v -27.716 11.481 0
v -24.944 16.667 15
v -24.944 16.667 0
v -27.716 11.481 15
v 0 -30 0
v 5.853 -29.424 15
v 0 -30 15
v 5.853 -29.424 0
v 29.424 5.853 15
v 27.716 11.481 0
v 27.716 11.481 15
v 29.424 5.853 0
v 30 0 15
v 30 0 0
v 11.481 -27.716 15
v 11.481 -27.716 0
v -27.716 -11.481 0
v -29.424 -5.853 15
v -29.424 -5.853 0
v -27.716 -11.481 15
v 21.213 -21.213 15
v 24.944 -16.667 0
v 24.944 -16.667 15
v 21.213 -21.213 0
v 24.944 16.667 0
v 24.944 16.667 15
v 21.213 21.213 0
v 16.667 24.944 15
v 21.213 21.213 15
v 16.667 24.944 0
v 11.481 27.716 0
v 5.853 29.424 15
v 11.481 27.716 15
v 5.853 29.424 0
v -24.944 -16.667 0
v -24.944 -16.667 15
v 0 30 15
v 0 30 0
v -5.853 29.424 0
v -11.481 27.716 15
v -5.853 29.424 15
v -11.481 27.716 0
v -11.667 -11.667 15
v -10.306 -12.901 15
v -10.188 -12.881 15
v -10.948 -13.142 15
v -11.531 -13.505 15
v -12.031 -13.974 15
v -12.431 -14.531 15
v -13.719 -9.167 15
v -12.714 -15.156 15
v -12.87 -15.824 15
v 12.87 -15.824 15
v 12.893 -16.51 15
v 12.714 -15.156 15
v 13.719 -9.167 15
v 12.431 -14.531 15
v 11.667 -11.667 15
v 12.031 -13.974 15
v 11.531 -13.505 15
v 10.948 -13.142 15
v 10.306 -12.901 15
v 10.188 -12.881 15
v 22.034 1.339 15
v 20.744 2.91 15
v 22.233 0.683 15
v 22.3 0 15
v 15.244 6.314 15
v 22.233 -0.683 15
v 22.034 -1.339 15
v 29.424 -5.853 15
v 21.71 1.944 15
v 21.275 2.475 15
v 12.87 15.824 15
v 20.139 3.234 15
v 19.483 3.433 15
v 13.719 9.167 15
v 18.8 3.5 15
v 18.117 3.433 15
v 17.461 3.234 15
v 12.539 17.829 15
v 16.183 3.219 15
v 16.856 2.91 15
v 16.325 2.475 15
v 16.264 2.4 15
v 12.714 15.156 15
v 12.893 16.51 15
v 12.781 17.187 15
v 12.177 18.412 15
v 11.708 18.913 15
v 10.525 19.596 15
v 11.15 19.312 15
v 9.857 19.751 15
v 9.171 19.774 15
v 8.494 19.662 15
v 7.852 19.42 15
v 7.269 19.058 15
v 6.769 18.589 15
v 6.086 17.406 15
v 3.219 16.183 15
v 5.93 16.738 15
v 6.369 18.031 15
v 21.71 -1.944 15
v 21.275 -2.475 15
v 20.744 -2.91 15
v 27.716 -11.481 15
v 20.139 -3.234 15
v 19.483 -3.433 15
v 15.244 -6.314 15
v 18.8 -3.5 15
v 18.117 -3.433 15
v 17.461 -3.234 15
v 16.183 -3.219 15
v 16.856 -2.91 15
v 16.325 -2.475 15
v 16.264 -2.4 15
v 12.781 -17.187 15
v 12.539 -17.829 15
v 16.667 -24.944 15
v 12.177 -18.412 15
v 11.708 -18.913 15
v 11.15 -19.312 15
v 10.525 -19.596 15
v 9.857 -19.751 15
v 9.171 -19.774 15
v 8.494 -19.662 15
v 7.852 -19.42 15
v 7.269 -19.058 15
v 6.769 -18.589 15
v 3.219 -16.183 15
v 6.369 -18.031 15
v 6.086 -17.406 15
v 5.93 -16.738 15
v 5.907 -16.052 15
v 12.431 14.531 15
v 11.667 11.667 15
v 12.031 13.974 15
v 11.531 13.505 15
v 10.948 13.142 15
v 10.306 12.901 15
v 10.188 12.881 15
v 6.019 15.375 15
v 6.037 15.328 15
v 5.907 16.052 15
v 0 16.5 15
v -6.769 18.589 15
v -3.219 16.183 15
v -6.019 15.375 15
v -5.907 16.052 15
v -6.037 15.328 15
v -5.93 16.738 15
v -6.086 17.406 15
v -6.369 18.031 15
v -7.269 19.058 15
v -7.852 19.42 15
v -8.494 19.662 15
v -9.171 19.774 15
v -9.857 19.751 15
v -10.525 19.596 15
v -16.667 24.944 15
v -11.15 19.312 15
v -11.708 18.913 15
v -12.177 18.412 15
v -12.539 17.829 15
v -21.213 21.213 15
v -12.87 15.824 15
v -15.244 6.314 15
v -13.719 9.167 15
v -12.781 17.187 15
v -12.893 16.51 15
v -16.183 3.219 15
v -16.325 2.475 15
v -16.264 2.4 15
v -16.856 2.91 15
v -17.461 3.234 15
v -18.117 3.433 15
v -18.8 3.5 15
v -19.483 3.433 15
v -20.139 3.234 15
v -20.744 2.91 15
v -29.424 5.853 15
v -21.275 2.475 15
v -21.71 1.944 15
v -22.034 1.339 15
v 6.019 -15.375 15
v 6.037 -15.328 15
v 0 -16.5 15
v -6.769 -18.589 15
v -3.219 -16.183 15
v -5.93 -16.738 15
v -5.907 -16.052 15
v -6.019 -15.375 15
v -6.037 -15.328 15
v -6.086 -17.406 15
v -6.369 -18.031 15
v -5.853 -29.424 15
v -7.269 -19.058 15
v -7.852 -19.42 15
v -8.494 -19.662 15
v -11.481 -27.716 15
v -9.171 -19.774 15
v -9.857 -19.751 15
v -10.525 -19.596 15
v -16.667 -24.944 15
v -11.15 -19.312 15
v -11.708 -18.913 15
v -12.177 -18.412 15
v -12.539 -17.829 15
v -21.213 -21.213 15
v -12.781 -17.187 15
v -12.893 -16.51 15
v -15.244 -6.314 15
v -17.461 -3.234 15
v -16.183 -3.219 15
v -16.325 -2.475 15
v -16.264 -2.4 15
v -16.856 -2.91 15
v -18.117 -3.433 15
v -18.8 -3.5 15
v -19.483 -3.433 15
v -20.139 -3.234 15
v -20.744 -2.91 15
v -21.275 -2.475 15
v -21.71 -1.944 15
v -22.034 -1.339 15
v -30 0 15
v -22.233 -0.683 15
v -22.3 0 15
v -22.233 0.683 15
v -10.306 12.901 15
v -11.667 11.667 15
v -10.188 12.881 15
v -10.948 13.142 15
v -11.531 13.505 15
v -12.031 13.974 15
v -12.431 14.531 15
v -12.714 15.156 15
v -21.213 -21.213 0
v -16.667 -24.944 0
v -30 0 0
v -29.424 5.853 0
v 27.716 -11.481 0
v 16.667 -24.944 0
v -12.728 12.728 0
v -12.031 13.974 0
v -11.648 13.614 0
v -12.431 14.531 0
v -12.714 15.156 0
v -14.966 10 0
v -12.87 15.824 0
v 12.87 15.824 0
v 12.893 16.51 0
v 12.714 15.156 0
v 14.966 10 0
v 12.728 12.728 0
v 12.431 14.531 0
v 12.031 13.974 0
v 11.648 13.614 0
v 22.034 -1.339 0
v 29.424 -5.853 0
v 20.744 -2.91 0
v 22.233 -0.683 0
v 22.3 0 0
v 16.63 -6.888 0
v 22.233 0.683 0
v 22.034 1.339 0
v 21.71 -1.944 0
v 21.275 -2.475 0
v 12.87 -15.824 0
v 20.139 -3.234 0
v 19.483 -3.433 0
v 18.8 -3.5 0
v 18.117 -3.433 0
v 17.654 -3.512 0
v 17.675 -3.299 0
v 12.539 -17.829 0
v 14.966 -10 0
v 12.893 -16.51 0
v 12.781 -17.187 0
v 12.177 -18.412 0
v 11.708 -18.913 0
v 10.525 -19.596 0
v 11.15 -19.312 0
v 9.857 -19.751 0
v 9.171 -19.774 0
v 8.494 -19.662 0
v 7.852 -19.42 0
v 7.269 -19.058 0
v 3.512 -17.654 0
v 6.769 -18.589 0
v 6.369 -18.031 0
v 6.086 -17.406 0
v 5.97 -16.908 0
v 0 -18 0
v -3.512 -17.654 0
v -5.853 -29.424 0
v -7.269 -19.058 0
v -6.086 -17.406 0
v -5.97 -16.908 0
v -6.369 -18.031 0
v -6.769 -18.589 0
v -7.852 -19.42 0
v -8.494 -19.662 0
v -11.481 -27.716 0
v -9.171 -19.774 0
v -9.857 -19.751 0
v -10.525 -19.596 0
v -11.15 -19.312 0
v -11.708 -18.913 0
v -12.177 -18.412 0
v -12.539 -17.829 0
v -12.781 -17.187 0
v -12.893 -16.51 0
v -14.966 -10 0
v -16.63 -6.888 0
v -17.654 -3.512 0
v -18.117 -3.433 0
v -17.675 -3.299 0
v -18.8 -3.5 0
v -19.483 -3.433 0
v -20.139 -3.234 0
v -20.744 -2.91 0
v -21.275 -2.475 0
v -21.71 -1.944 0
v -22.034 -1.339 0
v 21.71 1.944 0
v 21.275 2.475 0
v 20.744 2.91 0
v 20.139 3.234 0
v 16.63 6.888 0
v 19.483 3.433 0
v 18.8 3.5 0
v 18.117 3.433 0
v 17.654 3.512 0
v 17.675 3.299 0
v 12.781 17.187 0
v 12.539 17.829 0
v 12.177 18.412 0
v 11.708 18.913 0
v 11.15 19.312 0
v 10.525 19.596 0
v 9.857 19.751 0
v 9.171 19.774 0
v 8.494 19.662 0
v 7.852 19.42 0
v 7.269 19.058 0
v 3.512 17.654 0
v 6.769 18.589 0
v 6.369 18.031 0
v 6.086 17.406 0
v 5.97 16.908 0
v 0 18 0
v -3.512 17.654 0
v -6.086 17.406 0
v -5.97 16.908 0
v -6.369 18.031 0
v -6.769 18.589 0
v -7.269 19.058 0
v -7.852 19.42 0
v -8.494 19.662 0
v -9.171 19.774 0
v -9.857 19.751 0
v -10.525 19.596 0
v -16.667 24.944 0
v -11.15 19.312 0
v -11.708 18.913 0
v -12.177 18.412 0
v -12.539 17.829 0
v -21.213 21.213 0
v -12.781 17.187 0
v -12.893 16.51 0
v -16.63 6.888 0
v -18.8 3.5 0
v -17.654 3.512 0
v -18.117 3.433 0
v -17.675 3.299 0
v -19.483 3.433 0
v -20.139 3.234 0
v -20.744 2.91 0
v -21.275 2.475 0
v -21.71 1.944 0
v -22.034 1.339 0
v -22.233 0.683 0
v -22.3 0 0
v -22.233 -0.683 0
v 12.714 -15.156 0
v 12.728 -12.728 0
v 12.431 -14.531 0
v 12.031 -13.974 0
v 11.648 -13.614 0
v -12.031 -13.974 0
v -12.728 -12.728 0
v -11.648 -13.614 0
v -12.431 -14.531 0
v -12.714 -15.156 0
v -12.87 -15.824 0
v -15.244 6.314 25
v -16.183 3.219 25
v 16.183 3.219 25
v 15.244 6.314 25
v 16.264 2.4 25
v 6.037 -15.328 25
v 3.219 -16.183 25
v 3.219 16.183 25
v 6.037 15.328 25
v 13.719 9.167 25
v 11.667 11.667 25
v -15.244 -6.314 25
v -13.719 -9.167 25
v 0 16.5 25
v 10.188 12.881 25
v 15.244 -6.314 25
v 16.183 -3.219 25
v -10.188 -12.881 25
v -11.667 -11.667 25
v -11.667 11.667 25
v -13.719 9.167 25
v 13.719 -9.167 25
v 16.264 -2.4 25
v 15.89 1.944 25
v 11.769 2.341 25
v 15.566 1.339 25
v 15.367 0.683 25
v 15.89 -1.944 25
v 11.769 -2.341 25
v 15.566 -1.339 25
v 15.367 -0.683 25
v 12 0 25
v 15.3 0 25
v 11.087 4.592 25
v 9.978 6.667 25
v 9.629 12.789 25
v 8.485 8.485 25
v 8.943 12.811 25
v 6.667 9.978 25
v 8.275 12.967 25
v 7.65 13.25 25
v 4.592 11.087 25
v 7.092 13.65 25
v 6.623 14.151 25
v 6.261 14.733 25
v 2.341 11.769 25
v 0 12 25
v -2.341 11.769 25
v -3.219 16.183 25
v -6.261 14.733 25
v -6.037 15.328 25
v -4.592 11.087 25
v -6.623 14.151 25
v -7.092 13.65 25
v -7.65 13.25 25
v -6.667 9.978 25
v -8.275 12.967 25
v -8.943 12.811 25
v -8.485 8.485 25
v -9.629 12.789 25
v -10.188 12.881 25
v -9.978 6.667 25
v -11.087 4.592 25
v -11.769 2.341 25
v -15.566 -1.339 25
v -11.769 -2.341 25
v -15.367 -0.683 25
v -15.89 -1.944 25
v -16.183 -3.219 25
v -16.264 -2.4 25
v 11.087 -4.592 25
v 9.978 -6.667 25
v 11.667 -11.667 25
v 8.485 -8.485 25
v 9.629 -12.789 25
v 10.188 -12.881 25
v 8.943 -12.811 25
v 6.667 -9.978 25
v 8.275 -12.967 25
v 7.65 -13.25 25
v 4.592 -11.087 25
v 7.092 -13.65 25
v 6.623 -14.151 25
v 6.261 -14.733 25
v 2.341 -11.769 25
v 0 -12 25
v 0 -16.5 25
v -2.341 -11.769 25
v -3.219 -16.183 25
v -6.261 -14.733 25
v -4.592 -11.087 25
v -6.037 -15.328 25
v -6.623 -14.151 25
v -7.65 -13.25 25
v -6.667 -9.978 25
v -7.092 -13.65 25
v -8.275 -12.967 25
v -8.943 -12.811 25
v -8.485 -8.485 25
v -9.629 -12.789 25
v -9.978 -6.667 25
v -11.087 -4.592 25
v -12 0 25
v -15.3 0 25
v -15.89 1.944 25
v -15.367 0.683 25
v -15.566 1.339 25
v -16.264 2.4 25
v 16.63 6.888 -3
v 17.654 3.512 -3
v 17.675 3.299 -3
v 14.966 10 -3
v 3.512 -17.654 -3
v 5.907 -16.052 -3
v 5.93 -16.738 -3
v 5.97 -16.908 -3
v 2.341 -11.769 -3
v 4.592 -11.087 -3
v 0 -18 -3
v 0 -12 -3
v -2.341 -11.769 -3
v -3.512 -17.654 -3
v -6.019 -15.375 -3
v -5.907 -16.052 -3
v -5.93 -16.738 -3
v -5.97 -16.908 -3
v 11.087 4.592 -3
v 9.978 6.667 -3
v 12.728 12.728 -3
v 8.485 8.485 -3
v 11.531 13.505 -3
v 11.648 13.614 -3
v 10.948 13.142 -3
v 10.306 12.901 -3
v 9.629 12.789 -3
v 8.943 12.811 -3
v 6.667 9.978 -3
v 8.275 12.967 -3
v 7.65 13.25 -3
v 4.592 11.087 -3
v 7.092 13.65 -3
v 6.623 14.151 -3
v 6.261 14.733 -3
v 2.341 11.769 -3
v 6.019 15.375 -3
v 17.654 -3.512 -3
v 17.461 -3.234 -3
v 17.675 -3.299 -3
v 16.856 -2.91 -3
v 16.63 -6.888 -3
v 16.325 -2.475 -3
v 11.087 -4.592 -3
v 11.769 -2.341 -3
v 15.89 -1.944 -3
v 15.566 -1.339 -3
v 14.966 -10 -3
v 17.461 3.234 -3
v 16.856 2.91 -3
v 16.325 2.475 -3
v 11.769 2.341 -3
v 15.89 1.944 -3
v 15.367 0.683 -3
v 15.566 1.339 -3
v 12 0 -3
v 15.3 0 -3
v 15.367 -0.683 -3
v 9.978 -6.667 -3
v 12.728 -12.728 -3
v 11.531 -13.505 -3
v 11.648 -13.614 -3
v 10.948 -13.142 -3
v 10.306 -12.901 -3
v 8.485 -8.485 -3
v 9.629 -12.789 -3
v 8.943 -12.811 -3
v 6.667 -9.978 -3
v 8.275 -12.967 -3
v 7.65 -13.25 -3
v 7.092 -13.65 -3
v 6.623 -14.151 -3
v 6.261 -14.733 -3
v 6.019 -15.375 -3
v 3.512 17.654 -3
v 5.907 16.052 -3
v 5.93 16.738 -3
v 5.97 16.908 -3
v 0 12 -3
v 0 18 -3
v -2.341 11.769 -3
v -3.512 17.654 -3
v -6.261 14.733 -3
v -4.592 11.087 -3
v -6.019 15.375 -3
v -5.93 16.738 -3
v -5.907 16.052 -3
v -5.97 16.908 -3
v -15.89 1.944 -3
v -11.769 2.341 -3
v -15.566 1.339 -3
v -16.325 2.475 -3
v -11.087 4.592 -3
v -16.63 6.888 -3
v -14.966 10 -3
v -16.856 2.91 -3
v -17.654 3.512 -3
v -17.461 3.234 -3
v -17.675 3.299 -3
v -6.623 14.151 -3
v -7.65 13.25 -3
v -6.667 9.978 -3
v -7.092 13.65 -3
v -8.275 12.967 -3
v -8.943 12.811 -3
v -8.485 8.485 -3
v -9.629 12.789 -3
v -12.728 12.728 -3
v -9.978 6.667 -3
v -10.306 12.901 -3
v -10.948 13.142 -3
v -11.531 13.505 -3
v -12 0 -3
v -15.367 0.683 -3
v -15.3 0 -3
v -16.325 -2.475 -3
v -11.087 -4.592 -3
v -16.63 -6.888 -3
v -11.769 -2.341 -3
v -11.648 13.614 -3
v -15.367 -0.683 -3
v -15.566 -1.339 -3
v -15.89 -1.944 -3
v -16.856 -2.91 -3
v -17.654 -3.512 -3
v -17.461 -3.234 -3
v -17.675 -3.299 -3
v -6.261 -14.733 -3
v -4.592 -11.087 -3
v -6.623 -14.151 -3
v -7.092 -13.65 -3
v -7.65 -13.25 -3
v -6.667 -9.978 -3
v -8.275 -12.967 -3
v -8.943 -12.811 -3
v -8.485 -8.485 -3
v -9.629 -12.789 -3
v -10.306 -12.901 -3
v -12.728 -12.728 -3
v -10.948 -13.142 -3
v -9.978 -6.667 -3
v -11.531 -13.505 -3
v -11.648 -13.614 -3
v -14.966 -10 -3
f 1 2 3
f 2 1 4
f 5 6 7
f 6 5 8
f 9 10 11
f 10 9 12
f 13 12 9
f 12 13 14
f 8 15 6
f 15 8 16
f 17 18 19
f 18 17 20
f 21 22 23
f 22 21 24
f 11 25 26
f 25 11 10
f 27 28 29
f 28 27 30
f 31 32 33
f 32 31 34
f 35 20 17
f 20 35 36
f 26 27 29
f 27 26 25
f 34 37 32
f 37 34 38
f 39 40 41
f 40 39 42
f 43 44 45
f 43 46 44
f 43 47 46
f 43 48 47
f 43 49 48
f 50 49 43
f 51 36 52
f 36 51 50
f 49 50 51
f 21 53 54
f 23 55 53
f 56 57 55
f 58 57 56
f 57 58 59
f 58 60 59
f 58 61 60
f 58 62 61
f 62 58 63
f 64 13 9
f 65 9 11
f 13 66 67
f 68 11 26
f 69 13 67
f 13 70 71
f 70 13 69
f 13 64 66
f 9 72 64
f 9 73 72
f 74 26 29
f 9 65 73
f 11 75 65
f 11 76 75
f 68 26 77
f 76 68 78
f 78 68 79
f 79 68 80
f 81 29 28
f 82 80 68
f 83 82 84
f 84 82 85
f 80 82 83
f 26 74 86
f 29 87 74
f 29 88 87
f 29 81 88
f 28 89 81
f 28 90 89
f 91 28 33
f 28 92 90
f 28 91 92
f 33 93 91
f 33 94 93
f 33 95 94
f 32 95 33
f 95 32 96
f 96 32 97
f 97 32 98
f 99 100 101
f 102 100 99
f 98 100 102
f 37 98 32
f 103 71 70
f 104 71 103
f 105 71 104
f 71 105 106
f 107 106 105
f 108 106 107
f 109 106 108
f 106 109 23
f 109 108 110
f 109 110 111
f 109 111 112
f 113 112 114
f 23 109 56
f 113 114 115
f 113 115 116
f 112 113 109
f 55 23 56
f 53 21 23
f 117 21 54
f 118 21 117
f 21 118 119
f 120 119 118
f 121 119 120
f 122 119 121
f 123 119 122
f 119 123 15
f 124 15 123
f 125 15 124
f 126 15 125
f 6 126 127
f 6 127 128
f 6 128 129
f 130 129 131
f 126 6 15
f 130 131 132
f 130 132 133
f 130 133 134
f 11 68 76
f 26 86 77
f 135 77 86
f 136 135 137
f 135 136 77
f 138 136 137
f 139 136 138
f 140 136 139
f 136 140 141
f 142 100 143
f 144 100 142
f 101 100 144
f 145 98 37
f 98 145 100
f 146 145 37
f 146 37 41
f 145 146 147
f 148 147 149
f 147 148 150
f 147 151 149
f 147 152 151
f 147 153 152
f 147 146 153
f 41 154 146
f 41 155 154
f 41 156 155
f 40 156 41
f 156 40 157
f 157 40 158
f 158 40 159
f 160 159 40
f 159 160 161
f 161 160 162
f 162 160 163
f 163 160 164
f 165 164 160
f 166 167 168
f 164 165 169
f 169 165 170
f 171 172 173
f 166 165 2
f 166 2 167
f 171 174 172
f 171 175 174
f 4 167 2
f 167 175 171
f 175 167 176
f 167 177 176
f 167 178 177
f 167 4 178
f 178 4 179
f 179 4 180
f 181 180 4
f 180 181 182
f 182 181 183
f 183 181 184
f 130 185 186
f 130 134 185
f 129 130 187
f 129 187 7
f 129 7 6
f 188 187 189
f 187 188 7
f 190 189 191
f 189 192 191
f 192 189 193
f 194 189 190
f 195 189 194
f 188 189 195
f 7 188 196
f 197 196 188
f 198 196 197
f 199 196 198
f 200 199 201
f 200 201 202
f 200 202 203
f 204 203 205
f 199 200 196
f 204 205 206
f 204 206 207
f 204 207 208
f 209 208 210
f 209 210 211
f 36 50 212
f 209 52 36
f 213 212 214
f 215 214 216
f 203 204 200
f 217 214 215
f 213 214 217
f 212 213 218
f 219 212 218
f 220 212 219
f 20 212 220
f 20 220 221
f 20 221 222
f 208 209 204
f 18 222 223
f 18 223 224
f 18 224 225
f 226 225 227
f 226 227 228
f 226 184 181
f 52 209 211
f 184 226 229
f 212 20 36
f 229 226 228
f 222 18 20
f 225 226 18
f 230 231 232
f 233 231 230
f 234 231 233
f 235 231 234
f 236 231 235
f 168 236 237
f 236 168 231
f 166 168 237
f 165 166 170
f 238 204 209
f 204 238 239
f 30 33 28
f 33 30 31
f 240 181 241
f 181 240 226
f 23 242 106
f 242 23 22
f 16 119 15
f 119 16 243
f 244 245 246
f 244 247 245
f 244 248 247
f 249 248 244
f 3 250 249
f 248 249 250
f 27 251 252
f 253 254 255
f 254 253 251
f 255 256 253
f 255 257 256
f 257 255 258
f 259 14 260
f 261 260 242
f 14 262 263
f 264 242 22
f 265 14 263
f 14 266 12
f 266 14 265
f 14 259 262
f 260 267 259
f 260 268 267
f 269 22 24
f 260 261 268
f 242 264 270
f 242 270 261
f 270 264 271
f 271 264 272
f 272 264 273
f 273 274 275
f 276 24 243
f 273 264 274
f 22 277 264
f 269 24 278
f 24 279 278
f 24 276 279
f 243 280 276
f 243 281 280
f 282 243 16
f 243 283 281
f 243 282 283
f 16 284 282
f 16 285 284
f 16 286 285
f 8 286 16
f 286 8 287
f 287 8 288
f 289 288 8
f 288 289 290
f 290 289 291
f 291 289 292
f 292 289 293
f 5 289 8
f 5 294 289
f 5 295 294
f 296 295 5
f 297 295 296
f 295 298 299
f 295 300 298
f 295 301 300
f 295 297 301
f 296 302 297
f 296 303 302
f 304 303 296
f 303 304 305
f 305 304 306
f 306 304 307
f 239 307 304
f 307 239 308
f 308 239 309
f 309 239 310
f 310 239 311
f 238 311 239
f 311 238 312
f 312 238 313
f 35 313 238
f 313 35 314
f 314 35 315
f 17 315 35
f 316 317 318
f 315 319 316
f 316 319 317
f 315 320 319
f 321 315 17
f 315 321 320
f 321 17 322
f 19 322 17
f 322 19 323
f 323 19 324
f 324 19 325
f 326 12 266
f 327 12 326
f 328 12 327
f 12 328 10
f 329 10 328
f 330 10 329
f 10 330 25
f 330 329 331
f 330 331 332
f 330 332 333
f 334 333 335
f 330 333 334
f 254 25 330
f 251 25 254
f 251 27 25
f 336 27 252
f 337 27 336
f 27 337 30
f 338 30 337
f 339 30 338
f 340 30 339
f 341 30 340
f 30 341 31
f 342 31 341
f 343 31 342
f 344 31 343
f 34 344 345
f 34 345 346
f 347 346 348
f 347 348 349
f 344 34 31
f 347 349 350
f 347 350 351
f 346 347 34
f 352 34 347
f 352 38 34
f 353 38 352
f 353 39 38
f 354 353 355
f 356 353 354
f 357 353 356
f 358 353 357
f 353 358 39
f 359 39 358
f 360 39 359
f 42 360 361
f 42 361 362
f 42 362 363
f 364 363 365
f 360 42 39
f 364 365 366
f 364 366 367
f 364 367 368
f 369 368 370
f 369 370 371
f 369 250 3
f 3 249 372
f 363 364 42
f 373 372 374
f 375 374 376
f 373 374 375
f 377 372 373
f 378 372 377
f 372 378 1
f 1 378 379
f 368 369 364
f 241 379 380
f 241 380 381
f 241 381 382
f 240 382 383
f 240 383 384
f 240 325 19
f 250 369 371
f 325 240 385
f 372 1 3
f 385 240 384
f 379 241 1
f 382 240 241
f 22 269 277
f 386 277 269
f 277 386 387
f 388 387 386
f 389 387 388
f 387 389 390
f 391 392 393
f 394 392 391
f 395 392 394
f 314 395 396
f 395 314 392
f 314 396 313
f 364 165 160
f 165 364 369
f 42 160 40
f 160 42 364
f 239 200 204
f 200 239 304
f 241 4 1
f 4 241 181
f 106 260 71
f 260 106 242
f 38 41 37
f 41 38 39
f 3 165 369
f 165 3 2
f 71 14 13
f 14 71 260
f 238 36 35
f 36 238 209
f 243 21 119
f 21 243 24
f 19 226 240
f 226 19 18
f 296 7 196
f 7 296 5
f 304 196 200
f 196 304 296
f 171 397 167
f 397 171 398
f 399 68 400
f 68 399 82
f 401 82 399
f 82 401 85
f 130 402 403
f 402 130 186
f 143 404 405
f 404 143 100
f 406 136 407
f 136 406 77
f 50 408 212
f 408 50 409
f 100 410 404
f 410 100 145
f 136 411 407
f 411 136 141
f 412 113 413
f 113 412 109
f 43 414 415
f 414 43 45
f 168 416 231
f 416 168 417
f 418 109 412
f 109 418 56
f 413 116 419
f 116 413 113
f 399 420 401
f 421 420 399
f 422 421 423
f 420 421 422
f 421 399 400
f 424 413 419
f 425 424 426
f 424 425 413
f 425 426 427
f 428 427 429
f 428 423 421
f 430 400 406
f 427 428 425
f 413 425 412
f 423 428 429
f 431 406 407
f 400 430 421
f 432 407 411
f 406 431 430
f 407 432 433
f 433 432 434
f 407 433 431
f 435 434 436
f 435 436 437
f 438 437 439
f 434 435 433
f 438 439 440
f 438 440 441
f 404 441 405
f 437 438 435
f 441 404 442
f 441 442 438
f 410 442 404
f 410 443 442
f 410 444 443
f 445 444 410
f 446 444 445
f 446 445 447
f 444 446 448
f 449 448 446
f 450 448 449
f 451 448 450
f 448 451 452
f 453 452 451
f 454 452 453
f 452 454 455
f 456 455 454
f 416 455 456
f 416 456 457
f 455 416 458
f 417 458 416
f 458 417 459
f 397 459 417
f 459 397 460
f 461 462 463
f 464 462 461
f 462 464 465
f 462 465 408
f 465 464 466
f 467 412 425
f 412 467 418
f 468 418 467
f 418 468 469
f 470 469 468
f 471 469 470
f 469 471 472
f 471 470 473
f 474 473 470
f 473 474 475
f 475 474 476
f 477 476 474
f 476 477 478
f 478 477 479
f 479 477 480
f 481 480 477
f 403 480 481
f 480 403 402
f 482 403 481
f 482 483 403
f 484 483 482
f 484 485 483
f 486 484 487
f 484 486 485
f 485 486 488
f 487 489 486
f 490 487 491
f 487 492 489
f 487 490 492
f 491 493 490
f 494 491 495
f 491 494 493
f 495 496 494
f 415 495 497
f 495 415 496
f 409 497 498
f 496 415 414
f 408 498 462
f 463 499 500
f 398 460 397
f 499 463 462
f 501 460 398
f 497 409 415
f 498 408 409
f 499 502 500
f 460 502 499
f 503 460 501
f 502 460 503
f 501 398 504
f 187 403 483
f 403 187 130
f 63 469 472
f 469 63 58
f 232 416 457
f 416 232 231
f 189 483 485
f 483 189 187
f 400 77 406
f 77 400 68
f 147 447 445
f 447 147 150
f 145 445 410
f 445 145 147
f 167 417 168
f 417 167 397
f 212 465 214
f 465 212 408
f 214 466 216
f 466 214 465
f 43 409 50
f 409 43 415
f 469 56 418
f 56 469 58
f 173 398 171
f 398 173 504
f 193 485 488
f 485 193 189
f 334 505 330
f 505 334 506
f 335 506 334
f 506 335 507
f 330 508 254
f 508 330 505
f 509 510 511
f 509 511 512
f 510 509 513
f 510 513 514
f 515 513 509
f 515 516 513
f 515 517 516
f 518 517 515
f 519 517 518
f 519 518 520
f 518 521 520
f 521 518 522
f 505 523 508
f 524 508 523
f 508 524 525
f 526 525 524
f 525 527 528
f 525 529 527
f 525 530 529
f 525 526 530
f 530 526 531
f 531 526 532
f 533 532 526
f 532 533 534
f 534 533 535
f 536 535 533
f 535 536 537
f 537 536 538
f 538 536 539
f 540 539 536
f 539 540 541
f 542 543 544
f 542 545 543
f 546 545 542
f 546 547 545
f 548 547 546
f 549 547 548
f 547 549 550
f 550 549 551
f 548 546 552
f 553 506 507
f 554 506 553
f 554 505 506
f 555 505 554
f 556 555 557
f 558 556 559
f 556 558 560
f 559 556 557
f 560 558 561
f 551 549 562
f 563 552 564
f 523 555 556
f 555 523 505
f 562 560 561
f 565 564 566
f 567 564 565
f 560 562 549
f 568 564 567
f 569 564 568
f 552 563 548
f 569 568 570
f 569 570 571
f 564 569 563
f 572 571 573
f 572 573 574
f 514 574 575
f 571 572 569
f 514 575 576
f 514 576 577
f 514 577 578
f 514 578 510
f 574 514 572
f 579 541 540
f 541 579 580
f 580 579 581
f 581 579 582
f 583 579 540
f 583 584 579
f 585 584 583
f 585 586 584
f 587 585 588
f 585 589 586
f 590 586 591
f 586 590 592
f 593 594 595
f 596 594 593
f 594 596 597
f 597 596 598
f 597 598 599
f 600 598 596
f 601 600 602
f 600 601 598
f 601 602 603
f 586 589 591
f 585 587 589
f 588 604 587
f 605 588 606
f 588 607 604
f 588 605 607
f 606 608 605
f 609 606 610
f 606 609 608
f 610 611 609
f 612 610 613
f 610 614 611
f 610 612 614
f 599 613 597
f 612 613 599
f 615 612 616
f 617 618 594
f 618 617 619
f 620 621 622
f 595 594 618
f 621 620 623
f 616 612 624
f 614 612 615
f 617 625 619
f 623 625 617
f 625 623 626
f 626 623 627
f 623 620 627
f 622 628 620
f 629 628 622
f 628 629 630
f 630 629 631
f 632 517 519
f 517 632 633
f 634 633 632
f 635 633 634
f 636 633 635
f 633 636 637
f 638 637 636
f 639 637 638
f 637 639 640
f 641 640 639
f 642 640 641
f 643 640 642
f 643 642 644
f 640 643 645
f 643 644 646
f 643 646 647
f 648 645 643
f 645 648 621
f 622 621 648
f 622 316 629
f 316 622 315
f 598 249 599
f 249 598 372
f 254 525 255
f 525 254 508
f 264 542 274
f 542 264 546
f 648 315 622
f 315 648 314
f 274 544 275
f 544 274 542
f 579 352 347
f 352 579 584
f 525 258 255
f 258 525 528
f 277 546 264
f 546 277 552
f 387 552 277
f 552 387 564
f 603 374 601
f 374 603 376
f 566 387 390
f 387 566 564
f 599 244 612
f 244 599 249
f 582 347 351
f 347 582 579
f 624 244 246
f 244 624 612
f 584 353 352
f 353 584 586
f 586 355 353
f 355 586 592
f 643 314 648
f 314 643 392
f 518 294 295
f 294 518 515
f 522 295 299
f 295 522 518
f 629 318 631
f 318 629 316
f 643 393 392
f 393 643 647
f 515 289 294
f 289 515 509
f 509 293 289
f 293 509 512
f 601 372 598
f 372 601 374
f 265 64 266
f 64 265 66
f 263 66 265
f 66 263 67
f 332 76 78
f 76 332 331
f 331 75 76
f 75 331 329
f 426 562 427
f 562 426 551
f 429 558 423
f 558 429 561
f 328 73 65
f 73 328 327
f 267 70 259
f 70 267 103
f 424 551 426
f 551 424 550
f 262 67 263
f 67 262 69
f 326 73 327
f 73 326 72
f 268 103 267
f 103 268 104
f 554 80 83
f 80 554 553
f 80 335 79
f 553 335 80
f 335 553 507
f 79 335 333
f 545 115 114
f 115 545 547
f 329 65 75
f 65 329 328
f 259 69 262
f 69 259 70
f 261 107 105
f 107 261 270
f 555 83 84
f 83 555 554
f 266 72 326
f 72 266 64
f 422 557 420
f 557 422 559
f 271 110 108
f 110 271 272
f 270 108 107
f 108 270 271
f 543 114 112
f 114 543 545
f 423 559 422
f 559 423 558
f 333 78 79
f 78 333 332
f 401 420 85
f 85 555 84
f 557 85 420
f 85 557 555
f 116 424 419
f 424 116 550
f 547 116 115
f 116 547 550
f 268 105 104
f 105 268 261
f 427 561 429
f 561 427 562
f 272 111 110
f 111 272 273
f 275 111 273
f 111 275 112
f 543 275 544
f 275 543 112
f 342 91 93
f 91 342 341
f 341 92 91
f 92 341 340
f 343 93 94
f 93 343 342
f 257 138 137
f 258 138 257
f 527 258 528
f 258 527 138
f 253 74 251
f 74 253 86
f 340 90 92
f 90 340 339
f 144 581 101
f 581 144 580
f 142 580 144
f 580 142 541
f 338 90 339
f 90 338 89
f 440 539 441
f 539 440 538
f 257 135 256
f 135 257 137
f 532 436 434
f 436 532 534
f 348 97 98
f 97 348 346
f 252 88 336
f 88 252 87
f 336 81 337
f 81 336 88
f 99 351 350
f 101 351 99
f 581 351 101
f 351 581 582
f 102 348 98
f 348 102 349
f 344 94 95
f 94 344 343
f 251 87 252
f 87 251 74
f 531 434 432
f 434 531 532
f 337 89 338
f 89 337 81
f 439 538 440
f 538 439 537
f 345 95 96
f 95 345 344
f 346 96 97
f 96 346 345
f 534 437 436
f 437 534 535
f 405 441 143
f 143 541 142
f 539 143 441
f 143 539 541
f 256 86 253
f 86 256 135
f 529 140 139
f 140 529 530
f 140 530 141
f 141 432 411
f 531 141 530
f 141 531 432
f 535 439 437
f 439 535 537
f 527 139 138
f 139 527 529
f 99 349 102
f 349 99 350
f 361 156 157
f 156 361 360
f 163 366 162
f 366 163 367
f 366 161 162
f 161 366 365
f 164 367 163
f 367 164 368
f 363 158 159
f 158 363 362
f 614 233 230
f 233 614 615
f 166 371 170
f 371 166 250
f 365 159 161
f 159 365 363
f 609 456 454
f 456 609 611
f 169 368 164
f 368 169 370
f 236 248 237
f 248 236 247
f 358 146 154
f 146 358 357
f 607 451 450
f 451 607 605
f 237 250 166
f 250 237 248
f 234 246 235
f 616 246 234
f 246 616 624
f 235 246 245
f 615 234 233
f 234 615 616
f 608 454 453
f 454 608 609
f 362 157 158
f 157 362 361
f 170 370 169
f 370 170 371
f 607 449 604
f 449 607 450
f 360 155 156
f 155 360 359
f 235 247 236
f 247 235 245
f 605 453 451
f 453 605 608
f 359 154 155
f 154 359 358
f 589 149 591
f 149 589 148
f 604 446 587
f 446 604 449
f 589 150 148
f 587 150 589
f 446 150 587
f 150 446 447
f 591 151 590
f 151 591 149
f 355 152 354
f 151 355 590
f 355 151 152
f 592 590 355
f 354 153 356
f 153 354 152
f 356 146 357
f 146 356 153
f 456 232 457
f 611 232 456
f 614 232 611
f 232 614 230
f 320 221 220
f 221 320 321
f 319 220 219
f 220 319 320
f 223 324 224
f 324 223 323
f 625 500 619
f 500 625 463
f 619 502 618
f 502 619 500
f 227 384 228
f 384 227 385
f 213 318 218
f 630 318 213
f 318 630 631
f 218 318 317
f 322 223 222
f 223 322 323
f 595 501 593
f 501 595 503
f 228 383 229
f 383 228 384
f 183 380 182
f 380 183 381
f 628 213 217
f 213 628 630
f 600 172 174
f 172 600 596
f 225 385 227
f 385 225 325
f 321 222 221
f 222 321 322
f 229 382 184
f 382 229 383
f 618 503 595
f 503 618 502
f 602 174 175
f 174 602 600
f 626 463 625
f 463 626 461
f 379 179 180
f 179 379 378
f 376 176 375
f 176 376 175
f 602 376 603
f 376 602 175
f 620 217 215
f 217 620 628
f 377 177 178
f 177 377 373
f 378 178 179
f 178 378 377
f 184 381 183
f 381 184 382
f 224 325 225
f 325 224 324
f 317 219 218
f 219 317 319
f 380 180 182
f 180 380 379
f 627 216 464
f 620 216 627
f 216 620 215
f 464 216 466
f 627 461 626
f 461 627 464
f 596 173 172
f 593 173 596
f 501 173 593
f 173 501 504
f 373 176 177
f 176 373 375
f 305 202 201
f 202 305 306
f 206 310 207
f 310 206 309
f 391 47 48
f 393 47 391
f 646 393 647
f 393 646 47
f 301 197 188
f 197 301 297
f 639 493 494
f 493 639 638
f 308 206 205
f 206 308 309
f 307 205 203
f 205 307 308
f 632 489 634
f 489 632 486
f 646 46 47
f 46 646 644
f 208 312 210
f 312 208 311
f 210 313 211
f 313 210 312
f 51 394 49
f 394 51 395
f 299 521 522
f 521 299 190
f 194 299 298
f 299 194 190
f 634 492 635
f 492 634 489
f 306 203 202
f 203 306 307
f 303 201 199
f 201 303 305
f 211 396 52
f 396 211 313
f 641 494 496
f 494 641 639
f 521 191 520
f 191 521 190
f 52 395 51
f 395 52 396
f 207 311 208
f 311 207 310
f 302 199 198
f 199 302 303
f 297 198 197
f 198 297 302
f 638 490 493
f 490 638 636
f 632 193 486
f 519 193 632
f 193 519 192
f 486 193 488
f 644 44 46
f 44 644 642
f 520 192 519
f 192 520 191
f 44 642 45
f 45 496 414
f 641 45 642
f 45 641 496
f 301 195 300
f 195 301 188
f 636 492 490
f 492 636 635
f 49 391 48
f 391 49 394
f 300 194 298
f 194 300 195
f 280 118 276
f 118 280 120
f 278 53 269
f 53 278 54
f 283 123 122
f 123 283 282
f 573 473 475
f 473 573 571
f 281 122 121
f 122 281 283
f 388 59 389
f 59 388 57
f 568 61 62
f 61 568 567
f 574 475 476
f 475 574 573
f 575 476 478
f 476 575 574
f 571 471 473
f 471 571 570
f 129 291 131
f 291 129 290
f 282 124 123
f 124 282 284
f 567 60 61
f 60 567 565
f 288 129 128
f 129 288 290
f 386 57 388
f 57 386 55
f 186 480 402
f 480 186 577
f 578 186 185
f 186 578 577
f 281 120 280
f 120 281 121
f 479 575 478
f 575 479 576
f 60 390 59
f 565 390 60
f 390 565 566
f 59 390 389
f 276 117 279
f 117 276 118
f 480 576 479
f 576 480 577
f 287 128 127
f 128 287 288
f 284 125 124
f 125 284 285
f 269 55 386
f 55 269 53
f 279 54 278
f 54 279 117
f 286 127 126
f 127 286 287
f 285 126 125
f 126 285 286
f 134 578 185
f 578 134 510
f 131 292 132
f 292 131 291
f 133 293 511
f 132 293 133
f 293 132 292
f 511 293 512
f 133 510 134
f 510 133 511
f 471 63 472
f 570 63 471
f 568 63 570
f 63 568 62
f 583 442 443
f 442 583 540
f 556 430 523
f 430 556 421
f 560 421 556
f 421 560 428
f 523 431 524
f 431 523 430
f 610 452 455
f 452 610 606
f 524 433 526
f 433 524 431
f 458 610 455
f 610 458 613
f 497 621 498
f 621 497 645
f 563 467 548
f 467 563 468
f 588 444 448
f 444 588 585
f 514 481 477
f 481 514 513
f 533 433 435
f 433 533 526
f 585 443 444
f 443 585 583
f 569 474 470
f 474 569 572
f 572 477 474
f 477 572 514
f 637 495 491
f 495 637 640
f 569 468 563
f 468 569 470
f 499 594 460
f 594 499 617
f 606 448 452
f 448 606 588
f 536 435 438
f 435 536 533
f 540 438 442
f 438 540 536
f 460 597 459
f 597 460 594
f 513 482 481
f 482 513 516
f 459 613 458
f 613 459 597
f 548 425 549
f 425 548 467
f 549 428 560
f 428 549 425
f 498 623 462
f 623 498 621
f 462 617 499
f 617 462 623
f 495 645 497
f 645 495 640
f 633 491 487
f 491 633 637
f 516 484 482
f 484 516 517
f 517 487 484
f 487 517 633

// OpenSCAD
$fn = 32;

// ----------------------------------------------------------------------
// Bolt-circle flange: 60 mm outside, 6 bolt holes, bore 24 mm
// ----------------------------------------------------------------------

// --- parameters (mm) ---
flange_d = 60;            // flange outside diameter
flange_t = 15;            // flange thickness
bolts = 6;                // number of bolt holes
bolt_d = 7;               // bolt clearance
bolt_r = 18.8;            // bolt circle radius
bore_d = 24;              // centre bore
hub_d = 33;               // raised hub diameter
hub_h = 10;               // raised hub height
spigot_d = 36;            // spigot diameter
spigot_h = 4;             // spigot height below the flange
sink = 1;                 // overlap into the flange

module body() {
  cylinder(h = flange_t, d = flange_d);
  /* raised hub, sunk 1 mm into the flange */
  translate([0, 0, flange_t - 1]) cylinder(h = hub_h + 1, d = hub_d);
  /* spigot on the back face, sunk into the flange */
  translate([0, 0, -spigot_h + sink]) cylinder(h = spigot_h, d = spigot_d);
}

difference() {
  body();
  /* bolt circle */
  for (i = [0 : bolts - 1]) rotate([0, 0, i * 360 / bolts]) translate([bolt_r, 0, -spigot_h - 1]) cylinder(h = flange_t + hub_h + spigot_h + 3, d = bolt_d);
  translate([0, 0, -spigot_h - 1]) cylinder(h = flange_t + hub_h + spigot_h + 3, d = bore_d);
}
